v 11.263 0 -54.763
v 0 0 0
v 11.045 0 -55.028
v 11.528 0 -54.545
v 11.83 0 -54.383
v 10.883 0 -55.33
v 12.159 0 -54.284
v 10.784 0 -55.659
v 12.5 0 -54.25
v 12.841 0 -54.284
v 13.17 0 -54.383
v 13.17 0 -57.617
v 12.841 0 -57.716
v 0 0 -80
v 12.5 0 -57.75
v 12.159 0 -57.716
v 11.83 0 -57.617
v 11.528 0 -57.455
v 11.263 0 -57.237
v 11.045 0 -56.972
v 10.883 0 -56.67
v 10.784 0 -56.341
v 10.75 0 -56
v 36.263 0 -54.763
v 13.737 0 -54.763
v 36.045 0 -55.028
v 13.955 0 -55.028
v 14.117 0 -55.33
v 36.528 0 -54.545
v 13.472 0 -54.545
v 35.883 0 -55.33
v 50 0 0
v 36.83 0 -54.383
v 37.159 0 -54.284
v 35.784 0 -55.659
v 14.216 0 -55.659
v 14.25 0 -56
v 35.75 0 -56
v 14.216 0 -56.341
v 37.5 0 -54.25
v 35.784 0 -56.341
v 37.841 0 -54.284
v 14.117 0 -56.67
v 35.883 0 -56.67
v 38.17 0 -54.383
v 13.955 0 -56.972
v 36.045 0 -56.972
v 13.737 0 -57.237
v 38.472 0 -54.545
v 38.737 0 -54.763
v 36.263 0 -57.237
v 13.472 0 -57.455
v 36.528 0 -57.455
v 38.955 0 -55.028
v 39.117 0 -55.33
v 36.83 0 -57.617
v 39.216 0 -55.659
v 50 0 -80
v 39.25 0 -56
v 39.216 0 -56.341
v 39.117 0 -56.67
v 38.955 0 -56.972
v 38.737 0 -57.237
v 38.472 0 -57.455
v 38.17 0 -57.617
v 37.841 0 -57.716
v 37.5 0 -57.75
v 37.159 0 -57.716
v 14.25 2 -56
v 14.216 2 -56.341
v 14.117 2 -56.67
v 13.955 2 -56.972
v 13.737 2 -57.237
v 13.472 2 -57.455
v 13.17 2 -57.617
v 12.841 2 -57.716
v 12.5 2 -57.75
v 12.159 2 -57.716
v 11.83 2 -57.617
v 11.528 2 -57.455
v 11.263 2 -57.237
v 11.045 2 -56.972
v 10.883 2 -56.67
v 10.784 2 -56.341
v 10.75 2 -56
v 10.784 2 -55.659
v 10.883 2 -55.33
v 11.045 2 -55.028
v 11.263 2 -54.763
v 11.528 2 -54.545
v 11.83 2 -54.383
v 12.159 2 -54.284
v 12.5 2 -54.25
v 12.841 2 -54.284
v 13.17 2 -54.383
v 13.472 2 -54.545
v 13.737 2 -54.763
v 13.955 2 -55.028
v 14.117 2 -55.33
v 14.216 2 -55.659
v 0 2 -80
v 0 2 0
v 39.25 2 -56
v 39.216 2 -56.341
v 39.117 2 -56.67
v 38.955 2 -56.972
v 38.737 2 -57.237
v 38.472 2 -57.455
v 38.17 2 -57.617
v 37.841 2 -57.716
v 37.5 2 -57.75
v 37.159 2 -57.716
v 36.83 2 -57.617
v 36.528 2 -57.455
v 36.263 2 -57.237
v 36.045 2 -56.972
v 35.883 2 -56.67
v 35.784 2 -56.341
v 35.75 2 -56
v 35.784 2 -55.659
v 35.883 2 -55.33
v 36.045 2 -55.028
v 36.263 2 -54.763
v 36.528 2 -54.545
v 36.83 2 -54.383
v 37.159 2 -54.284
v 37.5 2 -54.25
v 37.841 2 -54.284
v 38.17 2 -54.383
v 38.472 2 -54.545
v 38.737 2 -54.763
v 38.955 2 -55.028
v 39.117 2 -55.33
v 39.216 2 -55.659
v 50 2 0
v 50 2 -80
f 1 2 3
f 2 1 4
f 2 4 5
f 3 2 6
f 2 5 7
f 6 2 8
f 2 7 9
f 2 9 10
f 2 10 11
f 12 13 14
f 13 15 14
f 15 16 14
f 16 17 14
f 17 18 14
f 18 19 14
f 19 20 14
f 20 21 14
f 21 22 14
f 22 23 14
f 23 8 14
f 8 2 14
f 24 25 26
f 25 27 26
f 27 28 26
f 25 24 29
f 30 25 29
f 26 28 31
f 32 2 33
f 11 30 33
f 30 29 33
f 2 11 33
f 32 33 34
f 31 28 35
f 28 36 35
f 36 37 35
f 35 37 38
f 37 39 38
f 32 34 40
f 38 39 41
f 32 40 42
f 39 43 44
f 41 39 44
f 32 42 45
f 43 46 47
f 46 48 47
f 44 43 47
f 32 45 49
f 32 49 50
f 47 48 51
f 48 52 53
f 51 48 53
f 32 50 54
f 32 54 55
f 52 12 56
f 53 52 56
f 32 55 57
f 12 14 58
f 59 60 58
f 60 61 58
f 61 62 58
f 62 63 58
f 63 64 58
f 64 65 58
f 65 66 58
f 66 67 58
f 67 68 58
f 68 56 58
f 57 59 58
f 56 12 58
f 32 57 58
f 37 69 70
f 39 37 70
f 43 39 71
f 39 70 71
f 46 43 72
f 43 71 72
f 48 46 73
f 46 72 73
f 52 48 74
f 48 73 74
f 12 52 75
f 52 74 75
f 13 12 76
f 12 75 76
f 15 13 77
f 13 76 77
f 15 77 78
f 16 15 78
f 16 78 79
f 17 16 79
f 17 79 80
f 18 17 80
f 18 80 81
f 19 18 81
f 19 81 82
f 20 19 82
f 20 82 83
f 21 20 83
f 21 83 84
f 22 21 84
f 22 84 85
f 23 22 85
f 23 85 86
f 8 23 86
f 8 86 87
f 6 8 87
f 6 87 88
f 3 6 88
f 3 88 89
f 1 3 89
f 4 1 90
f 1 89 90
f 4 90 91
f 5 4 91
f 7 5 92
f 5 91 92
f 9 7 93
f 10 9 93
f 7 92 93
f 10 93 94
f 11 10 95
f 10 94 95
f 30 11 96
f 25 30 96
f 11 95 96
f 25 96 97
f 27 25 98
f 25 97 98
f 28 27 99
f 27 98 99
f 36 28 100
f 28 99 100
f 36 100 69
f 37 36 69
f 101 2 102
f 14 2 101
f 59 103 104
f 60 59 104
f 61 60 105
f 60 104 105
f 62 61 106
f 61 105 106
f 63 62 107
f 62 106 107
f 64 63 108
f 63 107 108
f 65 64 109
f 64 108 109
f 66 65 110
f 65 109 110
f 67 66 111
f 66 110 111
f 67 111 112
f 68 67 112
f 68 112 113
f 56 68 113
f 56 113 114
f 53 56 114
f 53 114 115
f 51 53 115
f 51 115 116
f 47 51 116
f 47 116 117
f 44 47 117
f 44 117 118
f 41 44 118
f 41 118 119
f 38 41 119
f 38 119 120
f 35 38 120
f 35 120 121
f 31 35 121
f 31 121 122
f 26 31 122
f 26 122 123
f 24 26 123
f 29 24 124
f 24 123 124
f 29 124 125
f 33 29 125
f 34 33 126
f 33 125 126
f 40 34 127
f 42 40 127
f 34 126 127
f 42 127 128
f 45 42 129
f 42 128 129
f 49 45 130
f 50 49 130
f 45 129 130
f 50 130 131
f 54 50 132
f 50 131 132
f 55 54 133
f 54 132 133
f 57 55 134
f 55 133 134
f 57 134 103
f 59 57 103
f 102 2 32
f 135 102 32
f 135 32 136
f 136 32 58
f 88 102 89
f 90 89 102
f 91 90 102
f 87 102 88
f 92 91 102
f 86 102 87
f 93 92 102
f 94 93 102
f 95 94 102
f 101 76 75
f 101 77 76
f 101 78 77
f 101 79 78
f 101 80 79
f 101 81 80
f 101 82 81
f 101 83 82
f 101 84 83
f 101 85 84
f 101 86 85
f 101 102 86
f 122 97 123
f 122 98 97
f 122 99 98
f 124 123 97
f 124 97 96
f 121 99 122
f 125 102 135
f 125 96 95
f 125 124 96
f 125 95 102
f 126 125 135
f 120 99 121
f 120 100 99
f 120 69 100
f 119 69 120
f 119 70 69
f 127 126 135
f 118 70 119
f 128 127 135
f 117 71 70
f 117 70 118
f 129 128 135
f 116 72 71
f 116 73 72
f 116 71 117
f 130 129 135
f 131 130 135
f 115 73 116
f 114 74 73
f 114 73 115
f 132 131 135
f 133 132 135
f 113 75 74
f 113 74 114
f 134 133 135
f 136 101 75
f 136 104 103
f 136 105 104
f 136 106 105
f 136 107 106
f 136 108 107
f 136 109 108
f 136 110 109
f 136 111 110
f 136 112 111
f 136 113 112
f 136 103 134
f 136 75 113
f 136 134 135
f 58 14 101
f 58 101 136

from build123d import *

# Parameters (mm, degrees)
ESQUISSE1_W             = 50
ESQUISSE1_H             = 80
BOSS_EXTRU_1_DEPTH      = 2
ENL_V_MAT_EXTRU_1_REACH = 4
ESQUISSE2_R             = 1.75


with BuildPart() as part:
    # Esquisse1 → Boss.-Extru.1 (new body)
    with BuildSketch(Plane(origin=(0, 0, 0), x_dir=(1, 0, 0), z_dir=(0, 1, 0))):
        with Locations((25, 40)):
            Rectangle(ESQUISSE1_W, ESQUISSE1_H)
    extrude(amount=BOSS_EXTRU_1_DEPTH)

    # Esquisse2 → Enlèv. mat.-Extru.1 (cut, up to next)
    with BuildSketch(Plane(origin=(0, 2, 0), x_dir=(1, 0, 0), z_dir=(0, 1, 0)), mode=Mode.PRIVATE) as enl_v_mat_extru_1_sk1:
        with Locations((12.5, 56)):
            Circle(ESQUISSE2_R)
    enl_v_mat_extru_1_tool1 = extrude(enl_v_mat_extru_1_sk1.sketch, amount=-ENL_V_MAT_EXTRU_1_REACH, mode=Mode.PRIVATE) & part.part
    add(enl_v_mat_extru_1_tool1.solids().sort_by_distance((12.5, 2, -56))[0], mode=Mode.SUBTRACT)
    # Esquisse2 → Enlèv. mat.-Extru.1 (cut, up to next)
    with BuildSketch(Plane(origin=(0, 2, 0), x_dir=(1, 0, 0), z_dir=(0, 1, 0)), mode=Mode.PRIVATE) as enl_v_mat_extru_1_sk2:
        with Locations((37.5, 56)):
            Circle(ESQUISSE2_R)
    enl_v_mat_extru_1_tool2 = extrude(enl_v_mat_extru_1_sk2.sketch, amount=-ENL_V_MAT_EXTRU_1_REACH, mode=Mode.PRIVATE) & part.part
    add(enl_v_mat_extru_1_tool2.solids().sort_by_distance((37.5, 2, -56))[0], mode=Mode.SUBTRACT)


solid = part.part
